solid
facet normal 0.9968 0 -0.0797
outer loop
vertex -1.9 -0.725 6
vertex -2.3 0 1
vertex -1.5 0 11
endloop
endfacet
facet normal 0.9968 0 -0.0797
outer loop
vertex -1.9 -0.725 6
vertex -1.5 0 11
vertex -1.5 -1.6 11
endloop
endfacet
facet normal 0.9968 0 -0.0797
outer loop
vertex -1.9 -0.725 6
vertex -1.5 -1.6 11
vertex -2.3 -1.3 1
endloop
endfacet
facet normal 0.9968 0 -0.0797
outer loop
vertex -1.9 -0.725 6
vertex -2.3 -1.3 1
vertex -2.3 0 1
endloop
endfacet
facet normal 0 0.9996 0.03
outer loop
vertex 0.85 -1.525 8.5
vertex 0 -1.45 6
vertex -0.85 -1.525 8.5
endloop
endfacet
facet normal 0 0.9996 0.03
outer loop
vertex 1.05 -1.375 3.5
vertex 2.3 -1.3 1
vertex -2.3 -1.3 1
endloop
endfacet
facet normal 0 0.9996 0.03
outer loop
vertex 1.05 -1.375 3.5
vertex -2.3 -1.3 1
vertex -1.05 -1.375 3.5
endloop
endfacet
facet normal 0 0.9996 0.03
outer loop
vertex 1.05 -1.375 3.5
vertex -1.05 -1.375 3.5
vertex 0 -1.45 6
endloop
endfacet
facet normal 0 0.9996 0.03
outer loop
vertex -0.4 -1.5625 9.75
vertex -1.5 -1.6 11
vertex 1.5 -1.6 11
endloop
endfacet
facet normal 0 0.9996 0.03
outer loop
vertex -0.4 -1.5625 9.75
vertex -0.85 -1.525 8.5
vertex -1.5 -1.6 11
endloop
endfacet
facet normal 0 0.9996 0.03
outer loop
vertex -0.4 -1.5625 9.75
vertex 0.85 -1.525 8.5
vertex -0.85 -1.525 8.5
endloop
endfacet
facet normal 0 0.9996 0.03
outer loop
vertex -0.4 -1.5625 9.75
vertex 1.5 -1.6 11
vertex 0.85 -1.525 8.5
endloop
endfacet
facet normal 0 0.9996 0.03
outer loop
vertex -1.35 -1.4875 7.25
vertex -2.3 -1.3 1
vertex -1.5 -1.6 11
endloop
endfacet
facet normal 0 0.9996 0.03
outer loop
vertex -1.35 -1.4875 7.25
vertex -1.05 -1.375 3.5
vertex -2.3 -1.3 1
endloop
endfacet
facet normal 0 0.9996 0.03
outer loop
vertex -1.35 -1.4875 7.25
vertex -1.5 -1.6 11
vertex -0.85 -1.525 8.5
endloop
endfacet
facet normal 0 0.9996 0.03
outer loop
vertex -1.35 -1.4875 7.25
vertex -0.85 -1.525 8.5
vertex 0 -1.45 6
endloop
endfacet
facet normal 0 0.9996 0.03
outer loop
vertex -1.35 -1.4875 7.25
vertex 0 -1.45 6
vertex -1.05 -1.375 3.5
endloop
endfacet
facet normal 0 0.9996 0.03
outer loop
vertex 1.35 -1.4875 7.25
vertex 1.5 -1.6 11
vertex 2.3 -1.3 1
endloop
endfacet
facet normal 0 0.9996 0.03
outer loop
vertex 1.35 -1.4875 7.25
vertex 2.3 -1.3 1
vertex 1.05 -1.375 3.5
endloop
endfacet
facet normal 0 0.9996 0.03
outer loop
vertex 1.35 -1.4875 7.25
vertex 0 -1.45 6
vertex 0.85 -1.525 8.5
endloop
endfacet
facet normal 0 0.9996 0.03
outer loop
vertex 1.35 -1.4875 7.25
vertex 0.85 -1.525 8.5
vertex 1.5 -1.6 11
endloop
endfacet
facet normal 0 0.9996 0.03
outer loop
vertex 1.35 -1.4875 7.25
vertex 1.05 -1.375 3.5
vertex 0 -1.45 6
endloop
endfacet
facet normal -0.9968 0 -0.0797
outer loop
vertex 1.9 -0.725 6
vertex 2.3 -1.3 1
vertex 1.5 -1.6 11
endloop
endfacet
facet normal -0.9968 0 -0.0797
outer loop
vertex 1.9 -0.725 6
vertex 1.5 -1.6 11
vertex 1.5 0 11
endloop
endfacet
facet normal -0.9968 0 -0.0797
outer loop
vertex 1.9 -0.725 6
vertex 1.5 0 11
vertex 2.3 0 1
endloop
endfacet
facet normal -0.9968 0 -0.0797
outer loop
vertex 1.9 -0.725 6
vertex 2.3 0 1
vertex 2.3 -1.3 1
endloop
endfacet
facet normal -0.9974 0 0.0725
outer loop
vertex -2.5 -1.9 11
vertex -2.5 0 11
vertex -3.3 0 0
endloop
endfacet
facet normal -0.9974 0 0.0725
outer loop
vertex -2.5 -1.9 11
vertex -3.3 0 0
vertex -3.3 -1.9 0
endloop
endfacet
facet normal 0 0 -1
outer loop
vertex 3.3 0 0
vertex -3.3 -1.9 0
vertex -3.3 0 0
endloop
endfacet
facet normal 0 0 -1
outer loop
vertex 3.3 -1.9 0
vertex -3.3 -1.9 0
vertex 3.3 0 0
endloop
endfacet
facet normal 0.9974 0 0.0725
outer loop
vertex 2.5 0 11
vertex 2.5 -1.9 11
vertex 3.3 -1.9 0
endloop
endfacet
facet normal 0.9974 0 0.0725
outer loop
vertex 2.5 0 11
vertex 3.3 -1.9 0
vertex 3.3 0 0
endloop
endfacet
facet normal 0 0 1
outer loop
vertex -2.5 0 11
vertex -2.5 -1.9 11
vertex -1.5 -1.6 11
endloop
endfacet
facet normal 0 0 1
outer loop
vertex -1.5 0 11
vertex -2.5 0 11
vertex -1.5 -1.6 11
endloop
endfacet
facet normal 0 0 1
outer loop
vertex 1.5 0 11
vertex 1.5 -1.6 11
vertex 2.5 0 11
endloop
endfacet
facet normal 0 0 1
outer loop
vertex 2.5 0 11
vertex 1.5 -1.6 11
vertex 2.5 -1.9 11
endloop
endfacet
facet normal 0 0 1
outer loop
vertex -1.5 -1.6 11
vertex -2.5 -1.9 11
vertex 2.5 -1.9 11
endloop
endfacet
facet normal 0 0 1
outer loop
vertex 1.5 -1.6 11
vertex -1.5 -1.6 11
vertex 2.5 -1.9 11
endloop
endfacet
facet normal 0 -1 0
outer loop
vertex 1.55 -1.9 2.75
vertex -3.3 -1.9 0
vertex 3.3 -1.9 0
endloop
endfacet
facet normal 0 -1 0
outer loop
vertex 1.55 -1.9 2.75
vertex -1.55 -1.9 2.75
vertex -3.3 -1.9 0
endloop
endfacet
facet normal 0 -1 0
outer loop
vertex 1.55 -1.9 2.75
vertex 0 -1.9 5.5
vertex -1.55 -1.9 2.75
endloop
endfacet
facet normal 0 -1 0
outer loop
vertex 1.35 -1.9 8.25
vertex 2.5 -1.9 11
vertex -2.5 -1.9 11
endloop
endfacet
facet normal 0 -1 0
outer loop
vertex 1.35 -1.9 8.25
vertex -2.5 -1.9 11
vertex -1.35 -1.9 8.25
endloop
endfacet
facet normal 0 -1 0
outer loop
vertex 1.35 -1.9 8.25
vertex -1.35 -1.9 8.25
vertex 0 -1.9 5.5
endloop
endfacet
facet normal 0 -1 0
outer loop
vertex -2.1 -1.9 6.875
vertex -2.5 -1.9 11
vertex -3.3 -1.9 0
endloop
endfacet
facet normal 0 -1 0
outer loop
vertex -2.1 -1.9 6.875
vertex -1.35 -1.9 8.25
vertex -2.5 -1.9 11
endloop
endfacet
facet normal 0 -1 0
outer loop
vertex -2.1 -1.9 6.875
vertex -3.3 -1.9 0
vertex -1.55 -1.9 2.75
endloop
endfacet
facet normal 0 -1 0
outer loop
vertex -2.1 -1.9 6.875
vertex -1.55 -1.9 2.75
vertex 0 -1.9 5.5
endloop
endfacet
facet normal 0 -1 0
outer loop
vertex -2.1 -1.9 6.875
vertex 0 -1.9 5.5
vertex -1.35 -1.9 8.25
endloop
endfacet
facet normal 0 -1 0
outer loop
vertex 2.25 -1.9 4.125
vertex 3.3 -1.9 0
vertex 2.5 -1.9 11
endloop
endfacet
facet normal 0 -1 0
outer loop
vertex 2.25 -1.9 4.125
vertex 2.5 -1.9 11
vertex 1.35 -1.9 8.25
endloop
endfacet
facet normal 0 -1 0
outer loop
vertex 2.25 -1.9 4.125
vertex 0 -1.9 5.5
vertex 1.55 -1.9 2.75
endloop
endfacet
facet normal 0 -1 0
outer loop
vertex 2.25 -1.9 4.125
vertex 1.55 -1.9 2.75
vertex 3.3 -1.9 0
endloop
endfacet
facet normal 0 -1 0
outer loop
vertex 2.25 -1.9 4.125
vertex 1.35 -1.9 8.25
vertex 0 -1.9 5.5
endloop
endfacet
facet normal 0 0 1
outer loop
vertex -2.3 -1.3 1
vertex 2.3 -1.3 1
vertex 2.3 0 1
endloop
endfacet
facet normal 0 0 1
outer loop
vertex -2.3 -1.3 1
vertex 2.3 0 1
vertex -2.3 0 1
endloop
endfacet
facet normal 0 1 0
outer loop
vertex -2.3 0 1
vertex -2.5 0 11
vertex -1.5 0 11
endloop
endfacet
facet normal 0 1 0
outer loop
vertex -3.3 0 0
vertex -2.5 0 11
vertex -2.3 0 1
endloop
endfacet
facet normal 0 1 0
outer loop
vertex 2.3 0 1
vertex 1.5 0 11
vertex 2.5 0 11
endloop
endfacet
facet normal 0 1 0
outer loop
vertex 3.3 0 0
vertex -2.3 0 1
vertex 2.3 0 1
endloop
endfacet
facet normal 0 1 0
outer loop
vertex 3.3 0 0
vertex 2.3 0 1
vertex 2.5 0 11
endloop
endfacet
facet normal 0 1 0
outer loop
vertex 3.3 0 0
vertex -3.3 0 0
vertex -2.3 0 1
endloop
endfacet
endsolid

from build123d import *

# Parameters (mm, degrees)
CORTE_MEIO_DEPTH      = 12.640446866
CORTE_MEIO_DEPTH_BACK = 12.640446866
ESBO_O3_W             = 10.701271156
ESBO_O3_H             = 3.779396545


with BuildPart() as part:
    # Esboço1 → Loft1 section 0
    with BuildSketch(Plane.XY):
        with BuildLine():
            Line((-3.3, -1.9), (3.3, -1.9))
            Line((3.3, -1.9), (3.3, 1.9))
            Line((3.3, 1.9), (-3.3, 1.9))
            Line((-3.3, 1.9), (-3.3, -1.9))
        make_face()
    # Esboço2 → Loft1 section 1
    with BuildSketch(Plane.XY.offset(11)):
        with BuildLine():
            Line((-2.5, -1.9), (2.5, -1.9))
            Line((2.5, -1.9), (2.5, 1.9))
            Line((2.5, 1.9), (-2.5, 1.9))
            Line((-2.5, 1.9), (-2.5, -1.9))
        make_face()
    loft()

    # Esboço3 → Corte Meio (cut, two sides: drawn at the far end of the back side and taken through both)
    with BuildSketch(Plane.XY.offset(-CORTE_MEIO_DEPTH_BACK)):
        with Locations((0.988815263, 1.889698273)):
            Rectangle(ESBO_O3_W, ESBO_O3_H)
    extrude(amount=CORTE_MEIO_DEPTH + CORTE_MEIO_DEPTH_BACK, mode=Mode.SUBTRACT)

    # Esboço6 → Loft de corte1 section 0
    with BuildSketch(Plane.XY.offset(11)):
        with BuildLine():
            Line((-1.5, -1.6), (1.5, -1.6))
            Line((1.5, -1.6), (1.5, 1.6))
            Line((1.5, 1.6), (-1.5, 1.6))
            Line((-1.5, 1.6), (-1.5, -1.6))
        make_face()
    # Esboço5 → Loft de corte1 section 1
    with BuildSketch(Plane.XY.offset(1)):
        with BuildLine():
            Line((2.3, -1.3), (-2.3, -1.3))
            Line((-2.3, -1.3), (-2.3, 1.3))
            Line((-2.3, 1.3), (2.3, 1.3))
            Line((2.3, 1.3), (2.3, -1.3))
        make_face()
    loft(mode=Mode.SUBTRACT)


solid = part.part
